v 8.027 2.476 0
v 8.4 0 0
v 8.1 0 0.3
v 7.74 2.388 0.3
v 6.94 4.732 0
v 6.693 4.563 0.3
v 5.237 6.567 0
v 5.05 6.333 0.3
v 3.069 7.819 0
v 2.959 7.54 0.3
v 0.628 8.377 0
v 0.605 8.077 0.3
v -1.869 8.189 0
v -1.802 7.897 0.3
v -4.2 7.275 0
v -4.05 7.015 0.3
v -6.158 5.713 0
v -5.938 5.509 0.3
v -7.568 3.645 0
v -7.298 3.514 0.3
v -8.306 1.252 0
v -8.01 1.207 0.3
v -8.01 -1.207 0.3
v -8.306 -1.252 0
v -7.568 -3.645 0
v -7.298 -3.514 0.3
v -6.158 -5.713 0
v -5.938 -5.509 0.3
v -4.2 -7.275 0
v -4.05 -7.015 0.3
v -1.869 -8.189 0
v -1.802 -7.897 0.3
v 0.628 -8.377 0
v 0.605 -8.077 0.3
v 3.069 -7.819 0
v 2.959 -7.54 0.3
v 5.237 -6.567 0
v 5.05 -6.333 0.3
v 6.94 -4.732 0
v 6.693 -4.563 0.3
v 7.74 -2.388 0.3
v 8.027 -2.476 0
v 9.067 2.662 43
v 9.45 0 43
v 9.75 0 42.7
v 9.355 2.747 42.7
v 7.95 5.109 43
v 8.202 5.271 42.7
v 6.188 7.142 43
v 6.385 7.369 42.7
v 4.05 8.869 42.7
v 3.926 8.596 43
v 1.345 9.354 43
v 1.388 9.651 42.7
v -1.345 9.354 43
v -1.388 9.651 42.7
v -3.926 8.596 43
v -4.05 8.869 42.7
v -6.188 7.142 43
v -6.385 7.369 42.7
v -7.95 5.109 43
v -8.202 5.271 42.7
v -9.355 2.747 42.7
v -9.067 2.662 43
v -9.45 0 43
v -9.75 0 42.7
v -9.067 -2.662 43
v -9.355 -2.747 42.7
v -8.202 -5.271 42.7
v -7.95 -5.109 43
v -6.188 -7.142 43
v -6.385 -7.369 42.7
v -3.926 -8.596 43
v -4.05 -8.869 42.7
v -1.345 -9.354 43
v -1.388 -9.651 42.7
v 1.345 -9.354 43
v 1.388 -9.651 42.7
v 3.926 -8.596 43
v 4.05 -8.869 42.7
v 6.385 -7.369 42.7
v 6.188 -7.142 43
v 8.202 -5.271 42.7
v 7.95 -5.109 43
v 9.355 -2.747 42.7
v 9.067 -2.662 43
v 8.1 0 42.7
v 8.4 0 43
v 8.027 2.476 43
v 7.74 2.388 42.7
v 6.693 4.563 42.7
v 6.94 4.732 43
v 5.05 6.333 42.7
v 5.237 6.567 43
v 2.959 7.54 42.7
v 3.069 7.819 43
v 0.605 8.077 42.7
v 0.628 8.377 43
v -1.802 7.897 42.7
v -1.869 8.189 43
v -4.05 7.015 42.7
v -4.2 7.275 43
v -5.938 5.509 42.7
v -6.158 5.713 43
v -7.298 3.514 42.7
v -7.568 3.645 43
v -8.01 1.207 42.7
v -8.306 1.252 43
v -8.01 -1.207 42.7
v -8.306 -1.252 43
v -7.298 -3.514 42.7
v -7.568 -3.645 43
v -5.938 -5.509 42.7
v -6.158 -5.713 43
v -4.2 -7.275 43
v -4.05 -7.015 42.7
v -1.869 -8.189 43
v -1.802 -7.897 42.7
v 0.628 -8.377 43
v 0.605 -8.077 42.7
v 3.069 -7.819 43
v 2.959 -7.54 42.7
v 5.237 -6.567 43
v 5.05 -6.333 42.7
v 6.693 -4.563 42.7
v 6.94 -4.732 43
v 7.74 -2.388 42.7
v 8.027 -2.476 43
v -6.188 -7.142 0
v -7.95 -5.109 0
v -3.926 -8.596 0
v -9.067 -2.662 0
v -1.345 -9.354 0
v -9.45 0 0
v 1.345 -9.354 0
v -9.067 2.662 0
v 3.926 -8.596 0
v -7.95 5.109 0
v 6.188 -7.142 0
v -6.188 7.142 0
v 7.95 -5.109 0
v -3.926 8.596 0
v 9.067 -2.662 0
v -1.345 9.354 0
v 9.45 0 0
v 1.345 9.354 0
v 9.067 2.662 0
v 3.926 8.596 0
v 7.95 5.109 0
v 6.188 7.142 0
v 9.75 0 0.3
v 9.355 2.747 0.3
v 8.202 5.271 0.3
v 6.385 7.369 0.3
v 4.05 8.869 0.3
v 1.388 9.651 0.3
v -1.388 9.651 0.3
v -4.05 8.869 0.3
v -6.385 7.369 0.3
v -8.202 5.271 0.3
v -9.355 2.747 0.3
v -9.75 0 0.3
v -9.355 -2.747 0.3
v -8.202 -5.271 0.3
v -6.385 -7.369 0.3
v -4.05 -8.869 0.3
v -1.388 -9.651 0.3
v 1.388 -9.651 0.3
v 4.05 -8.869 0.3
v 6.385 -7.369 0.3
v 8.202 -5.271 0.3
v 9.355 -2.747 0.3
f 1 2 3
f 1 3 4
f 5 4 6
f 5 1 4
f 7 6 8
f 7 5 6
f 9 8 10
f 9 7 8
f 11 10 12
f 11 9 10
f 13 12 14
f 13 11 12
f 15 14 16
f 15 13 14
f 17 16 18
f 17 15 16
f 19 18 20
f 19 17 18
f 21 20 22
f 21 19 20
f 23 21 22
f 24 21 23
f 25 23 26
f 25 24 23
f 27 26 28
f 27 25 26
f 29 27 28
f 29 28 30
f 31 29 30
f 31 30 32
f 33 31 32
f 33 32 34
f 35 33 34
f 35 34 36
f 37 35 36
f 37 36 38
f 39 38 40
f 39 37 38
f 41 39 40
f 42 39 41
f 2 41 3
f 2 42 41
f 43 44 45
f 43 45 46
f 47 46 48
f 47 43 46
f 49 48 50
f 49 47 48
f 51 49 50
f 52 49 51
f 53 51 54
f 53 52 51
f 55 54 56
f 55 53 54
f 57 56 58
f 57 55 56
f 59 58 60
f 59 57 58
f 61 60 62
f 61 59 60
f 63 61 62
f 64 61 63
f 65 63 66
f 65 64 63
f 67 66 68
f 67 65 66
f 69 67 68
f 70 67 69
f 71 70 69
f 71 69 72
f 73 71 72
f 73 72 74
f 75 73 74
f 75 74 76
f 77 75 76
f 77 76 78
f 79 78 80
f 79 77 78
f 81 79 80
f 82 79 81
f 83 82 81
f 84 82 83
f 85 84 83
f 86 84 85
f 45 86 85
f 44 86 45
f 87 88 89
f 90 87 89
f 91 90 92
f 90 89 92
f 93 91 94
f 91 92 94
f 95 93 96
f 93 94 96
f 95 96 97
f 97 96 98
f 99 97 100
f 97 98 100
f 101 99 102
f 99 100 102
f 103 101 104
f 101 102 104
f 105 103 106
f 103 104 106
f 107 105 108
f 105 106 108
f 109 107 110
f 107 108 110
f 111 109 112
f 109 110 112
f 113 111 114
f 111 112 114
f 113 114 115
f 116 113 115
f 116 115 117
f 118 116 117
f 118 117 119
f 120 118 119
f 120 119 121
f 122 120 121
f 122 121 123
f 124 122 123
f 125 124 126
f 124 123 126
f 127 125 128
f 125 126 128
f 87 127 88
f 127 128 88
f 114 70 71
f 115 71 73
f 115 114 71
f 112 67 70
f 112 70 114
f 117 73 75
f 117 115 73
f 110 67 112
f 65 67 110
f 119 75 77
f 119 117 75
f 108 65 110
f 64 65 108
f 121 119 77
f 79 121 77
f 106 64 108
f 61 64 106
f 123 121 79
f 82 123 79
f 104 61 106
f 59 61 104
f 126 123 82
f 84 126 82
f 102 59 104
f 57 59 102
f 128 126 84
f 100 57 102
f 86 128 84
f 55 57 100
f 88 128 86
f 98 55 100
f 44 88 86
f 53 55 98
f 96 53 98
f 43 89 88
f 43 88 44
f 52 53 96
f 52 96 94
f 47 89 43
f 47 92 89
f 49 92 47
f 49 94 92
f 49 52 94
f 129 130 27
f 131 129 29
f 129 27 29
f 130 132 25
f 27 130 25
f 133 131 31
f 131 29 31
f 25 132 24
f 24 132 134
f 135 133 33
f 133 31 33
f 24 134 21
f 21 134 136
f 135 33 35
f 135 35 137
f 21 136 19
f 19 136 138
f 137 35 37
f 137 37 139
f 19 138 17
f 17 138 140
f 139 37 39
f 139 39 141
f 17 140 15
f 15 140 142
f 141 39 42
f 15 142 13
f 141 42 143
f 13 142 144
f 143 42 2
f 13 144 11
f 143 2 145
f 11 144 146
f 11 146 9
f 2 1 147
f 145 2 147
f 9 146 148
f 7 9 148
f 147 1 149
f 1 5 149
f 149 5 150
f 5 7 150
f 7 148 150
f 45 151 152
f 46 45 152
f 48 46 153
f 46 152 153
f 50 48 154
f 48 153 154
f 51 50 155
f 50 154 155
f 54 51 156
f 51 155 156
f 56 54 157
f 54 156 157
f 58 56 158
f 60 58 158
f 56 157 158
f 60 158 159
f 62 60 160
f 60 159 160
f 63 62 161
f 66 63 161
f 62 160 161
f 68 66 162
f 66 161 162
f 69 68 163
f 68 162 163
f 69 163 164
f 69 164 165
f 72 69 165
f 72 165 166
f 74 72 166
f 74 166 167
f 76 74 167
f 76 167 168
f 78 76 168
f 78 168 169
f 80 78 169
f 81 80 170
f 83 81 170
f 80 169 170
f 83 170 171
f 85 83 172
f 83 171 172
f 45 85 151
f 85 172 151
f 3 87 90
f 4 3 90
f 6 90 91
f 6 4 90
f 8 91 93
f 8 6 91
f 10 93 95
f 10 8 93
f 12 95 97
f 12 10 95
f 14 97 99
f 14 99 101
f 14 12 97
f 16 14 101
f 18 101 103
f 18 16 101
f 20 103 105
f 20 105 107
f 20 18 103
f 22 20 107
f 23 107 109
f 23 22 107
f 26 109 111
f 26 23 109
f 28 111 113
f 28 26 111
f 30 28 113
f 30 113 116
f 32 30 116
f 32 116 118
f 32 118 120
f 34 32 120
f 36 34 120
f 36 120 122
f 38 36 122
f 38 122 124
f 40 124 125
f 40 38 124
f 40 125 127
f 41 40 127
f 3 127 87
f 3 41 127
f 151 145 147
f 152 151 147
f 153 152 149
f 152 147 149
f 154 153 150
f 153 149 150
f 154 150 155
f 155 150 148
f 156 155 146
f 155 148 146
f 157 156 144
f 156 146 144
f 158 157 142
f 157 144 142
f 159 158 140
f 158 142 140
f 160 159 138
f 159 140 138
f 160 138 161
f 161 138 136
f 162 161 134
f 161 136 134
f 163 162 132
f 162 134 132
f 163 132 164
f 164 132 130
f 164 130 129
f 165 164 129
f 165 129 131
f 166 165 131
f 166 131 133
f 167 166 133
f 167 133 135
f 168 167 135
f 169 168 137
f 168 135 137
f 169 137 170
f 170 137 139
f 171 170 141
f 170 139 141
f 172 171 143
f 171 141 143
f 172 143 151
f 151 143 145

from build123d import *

# Parameters (mm, degrees)
F0_R     = 9.75
F0_R_2   = 8.1
F1_DEPTH = 43
F2_SIZE  = 0.3


with BuildPart() as f1:
    # F0 (on Top) → F1 (new body)
    with BuildSketch(Plane.XY):
        Circle(F0_R)
        Circle(F0_R_2, mode=Mode.SUBTRACT)
    extrude(amount=F1_DEPTH)

    # F2
    f2_edges = [f1.edges().sort_by_distance(p)[0] for p in [
        (9.75, 0, 21.5),
        (-9.75, 0, 0),
        (-9.75, 0, 43),
        (8.1, 0, 21.5),
        (-8.1, 0, 0),
        (-8.1, 0, 43),
    ]]
    chamfer(f2_edges, length=F2_SIZE)


solid = f1.part
